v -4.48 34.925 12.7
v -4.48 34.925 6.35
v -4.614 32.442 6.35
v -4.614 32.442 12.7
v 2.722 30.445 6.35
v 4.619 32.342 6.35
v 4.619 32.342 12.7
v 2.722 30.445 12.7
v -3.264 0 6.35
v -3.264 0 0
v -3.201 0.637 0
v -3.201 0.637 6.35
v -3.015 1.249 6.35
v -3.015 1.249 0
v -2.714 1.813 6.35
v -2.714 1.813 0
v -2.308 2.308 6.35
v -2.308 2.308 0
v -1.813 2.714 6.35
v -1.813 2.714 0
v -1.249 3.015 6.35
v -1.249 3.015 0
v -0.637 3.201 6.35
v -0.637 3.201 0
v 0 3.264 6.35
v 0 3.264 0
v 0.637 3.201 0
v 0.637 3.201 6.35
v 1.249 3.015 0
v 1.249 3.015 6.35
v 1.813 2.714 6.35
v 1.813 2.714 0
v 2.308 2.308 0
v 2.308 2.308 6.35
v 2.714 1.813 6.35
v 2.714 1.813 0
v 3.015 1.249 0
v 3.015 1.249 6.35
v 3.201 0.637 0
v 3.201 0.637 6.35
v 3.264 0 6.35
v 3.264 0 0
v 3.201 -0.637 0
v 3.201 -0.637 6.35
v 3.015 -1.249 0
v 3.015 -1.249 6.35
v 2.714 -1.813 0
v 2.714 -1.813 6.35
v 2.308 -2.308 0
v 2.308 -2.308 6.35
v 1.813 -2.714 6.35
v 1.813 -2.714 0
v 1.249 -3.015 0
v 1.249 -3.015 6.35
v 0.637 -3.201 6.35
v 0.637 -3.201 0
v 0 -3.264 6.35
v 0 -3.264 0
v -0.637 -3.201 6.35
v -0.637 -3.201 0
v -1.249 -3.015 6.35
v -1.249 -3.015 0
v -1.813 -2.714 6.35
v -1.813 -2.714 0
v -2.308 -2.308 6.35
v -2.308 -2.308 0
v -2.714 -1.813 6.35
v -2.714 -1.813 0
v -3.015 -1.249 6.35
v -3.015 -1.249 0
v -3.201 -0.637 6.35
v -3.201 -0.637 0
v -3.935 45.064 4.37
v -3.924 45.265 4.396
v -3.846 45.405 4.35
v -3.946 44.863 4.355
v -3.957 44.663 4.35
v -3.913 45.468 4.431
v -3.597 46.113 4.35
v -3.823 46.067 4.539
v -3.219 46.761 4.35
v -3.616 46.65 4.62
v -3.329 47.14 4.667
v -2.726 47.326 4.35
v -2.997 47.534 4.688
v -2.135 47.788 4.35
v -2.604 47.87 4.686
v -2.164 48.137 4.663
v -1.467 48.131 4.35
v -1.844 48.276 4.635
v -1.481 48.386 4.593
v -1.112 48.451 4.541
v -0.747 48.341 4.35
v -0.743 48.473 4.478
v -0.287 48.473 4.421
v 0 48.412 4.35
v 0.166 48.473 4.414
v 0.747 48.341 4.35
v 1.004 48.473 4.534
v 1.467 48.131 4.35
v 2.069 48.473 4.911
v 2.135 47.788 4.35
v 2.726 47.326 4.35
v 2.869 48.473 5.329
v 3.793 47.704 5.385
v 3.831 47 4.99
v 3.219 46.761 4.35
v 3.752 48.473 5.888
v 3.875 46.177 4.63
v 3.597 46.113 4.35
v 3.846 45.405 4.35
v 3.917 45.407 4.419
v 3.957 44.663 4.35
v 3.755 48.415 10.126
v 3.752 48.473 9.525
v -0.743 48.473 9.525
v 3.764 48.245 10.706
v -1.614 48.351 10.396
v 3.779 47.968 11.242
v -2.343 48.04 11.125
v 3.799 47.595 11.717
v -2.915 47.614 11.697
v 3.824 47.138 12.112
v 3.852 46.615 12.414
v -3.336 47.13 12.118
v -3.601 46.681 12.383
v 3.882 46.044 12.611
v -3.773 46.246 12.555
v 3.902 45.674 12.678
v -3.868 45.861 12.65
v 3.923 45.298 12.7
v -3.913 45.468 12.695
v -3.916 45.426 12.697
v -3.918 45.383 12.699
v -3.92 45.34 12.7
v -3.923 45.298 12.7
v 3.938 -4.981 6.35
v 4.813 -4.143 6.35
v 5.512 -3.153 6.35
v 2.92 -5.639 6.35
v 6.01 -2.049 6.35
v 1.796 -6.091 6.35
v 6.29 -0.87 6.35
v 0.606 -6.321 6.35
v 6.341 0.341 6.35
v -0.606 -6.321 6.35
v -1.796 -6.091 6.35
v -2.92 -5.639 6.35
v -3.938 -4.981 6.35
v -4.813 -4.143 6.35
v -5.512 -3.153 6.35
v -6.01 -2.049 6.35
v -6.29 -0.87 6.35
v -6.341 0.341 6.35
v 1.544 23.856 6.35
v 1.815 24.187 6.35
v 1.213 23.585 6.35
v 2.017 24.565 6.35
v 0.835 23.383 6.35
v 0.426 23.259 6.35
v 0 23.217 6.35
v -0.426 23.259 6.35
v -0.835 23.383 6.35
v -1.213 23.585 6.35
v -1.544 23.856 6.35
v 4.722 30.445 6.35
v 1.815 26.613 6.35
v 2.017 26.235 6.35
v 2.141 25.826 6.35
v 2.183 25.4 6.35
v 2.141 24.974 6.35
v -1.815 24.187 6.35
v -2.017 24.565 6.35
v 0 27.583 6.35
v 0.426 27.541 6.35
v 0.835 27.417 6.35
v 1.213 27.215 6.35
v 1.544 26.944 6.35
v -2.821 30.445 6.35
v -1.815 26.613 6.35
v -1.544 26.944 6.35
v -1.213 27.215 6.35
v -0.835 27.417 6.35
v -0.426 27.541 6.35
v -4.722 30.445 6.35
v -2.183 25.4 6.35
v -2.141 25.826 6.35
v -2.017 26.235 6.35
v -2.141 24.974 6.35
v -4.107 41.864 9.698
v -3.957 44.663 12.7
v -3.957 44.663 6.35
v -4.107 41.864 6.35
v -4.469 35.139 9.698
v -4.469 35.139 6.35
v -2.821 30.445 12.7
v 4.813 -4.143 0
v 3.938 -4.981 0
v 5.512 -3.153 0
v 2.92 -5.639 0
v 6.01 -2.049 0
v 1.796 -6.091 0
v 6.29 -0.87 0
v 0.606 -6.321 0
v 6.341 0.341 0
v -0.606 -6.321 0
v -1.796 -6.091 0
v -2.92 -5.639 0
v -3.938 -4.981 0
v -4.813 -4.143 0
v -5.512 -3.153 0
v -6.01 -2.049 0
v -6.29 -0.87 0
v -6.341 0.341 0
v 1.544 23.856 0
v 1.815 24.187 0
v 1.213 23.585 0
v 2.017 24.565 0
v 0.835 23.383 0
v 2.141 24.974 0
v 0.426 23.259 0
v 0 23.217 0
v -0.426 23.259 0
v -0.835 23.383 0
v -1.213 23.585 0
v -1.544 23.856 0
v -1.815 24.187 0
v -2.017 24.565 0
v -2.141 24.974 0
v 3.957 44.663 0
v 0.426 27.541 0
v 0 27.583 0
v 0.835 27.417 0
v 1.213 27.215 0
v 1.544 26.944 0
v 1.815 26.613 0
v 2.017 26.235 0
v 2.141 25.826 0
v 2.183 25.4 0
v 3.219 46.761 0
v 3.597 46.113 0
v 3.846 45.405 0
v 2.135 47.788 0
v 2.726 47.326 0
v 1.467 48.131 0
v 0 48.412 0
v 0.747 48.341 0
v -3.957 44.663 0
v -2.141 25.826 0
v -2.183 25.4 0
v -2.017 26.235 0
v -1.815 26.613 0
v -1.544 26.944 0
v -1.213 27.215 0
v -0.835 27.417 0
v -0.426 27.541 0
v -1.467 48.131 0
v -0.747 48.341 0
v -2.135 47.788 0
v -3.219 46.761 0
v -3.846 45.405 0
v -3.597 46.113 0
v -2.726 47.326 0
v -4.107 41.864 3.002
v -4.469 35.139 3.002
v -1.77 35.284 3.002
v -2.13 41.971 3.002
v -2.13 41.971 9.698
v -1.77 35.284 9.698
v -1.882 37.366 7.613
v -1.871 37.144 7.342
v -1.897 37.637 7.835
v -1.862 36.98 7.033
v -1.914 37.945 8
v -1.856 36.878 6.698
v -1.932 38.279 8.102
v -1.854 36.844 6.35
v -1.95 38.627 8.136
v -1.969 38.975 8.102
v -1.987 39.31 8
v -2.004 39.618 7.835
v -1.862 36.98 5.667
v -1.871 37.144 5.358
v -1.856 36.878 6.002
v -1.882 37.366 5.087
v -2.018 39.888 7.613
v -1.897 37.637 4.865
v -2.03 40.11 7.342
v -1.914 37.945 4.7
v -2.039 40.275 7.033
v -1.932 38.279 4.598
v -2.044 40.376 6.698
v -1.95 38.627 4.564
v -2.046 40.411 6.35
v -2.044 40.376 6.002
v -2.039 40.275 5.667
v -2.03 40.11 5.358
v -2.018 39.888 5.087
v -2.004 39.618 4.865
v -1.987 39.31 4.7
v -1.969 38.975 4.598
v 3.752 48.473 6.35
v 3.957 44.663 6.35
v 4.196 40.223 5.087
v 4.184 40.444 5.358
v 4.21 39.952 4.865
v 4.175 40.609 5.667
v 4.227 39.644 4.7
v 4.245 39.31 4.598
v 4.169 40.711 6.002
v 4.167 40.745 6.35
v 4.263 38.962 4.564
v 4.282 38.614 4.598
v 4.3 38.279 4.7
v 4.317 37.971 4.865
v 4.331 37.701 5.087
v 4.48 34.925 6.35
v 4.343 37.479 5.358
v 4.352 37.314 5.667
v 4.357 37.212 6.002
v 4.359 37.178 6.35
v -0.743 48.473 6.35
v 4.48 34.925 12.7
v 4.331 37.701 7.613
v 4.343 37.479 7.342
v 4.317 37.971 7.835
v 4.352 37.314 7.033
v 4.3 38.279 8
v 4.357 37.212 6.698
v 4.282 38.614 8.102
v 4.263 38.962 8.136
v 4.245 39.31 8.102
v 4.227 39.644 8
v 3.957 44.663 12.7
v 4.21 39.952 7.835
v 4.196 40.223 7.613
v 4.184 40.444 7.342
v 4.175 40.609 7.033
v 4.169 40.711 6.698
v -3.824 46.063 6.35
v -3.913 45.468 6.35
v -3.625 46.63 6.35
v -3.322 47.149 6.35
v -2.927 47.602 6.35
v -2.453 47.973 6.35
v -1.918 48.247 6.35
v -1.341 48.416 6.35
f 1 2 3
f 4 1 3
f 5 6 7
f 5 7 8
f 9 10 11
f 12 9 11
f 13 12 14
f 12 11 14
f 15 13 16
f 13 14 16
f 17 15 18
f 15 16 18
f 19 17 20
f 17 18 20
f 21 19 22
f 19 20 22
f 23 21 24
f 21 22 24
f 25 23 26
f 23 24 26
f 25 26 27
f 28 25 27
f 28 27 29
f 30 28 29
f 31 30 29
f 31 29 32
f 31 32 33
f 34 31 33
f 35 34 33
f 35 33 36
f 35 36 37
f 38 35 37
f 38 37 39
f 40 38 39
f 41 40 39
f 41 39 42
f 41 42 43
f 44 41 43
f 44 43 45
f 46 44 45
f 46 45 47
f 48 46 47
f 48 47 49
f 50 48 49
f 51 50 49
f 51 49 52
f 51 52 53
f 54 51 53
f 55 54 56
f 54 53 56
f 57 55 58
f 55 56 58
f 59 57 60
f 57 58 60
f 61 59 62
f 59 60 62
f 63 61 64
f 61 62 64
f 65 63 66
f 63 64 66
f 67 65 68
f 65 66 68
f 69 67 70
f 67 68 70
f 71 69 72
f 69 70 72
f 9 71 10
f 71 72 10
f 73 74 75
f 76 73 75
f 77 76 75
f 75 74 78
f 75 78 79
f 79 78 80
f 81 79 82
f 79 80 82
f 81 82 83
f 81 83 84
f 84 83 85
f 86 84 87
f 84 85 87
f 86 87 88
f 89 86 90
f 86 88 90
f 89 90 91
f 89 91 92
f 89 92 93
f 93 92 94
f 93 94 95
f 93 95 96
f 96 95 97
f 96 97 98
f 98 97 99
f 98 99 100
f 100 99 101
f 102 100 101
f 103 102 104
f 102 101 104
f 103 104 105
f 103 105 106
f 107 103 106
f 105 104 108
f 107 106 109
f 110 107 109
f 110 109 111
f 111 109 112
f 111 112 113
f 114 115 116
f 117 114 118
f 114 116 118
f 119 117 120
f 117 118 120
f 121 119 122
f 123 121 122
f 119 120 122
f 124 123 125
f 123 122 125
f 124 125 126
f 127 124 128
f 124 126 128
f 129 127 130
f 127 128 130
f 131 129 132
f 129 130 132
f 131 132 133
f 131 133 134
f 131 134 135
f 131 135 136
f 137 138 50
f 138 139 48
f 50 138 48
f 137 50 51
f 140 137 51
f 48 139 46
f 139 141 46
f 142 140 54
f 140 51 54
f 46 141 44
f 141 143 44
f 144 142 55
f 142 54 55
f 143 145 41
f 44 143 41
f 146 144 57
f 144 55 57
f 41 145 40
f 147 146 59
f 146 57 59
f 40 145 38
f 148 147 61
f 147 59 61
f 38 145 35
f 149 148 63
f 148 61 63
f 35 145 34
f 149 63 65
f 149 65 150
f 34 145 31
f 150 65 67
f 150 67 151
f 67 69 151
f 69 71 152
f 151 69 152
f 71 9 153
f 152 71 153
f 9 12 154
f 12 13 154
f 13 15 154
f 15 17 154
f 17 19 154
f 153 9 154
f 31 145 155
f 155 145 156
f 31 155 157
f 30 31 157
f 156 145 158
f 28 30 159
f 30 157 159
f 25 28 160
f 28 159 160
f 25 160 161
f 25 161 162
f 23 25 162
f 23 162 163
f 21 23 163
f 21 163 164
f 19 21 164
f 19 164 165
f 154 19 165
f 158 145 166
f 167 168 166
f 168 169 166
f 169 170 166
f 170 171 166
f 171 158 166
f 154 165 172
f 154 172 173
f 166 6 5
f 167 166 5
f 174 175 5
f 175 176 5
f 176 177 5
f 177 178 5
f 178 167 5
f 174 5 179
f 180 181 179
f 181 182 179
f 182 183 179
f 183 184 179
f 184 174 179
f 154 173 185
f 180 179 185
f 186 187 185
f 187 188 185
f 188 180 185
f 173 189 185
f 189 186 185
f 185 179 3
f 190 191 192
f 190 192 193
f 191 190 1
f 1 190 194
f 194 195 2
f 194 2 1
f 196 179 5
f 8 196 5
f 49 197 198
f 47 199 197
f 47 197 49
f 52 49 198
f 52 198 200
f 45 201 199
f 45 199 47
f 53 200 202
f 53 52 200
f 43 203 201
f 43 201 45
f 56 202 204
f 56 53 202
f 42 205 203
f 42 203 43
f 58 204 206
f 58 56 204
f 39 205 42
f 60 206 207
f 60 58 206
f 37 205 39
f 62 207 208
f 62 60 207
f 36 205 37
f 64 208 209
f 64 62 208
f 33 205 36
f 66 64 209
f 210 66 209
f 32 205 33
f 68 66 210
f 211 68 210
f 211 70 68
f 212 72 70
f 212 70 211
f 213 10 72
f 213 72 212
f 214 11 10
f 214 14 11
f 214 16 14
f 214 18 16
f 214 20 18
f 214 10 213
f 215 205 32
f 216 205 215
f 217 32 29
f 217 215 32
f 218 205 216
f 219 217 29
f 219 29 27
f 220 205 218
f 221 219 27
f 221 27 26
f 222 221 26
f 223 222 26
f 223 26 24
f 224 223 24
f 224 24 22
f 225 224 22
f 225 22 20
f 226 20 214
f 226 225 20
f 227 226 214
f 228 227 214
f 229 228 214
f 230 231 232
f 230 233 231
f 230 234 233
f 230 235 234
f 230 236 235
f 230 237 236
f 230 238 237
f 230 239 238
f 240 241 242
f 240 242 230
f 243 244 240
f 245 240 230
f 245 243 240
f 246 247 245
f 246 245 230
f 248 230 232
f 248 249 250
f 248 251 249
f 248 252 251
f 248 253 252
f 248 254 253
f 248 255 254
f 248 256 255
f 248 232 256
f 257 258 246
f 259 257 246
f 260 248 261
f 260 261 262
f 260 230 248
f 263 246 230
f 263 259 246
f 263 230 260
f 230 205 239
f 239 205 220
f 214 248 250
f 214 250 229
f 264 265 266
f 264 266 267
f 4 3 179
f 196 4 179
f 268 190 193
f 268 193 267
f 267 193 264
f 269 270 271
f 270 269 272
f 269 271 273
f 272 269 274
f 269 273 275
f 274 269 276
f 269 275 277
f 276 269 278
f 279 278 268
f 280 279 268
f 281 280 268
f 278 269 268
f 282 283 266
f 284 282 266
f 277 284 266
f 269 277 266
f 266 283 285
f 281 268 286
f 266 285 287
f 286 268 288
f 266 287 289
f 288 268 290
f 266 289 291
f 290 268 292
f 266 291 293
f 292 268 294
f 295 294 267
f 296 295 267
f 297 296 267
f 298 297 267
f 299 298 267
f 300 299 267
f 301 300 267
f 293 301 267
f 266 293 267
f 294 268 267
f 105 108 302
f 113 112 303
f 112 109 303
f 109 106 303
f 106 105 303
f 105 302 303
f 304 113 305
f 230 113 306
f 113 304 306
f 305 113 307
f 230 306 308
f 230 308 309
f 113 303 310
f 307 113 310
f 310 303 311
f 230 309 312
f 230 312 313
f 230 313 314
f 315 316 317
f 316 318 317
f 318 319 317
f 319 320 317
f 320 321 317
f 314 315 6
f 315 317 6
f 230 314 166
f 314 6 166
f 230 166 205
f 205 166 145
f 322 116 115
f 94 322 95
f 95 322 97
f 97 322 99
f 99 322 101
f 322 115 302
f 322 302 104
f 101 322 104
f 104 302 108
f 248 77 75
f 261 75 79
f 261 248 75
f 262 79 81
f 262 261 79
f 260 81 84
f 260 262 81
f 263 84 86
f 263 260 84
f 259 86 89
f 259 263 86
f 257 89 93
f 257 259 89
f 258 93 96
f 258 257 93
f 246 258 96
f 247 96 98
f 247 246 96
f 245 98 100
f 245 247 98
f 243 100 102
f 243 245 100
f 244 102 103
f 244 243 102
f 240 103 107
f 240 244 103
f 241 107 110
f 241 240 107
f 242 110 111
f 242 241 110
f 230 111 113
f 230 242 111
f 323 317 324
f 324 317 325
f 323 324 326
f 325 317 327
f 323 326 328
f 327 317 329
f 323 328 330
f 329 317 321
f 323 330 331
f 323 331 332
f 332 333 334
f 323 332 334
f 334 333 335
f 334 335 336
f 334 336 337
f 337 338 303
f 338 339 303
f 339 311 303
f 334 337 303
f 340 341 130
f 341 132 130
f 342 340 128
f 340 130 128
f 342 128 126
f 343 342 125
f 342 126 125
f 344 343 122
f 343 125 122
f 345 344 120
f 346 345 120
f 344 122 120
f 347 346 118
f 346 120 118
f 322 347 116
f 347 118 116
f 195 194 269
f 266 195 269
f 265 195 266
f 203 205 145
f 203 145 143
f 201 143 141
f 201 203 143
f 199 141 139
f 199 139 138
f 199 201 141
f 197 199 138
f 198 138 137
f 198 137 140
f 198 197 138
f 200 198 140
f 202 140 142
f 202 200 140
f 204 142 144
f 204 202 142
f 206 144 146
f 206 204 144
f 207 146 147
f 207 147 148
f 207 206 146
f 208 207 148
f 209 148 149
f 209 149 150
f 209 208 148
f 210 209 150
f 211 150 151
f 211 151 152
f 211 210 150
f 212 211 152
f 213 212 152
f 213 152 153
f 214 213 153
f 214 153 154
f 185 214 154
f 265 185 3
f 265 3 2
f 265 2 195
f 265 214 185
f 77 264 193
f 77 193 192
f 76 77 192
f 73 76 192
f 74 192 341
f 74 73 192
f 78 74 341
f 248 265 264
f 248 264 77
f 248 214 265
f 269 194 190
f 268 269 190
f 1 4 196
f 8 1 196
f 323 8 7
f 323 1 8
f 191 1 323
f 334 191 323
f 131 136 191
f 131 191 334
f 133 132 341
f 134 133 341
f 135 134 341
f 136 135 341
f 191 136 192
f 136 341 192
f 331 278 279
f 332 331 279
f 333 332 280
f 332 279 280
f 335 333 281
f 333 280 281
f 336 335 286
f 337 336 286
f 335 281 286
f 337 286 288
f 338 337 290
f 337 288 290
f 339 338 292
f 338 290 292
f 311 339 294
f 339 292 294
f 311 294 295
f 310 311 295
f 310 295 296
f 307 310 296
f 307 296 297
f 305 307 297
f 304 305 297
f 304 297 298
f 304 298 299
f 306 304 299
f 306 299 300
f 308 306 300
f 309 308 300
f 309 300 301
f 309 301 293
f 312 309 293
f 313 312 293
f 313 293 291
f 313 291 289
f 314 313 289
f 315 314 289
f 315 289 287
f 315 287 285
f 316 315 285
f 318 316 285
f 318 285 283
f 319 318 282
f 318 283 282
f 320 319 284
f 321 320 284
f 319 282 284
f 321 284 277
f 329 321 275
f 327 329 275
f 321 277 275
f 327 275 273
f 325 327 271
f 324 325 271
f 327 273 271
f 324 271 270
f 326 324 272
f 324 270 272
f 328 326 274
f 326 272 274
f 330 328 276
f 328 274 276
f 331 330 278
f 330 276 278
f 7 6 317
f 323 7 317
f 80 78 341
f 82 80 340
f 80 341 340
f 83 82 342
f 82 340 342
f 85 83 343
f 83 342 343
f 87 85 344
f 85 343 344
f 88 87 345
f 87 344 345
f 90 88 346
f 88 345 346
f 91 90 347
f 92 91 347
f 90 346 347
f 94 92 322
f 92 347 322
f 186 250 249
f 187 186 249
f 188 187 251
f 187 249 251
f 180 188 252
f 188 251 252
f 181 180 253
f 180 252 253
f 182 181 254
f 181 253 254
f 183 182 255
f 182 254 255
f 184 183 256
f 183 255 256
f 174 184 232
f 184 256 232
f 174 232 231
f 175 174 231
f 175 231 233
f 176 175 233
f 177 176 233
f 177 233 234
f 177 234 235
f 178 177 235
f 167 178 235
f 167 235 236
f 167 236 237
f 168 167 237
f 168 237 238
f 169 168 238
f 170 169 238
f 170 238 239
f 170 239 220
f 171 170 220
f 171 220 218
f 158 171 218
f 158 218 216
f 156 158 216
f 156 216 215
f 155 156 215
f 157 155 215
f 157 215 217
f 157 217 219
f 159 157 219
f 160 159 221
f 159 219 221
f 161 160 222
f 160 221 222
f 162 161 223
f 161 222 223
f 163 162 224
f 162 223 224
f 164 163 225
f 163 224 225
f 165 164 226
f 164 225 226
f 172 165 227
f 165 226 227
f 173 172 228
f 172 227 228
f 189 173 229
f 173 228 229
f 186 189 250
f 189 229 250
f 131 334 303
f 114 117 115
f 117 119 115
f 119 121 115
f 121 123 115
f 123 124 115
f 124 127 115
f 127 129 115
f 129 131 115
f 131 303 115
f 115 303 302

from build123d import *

# Parameters (mm, degrees)
BOSS_EXTRUDE1_DEPTH              = 6.35
F_0_257_DIAMETER_HOLE1_D         = 6.5278
F_11_64_0_17188_DIAMETER_HOLE2_D = 4.365752
BOSS_EXTRUDE2_DEPTH              = 6.35
CHAMFER1_SIZE                    = 2
CHAMFER1_SIZE_2                  = 1.900651734
F_9_64_0_14063_DIAMETER_HOLE3_D  = 3.572002
CUT_EXTRUDE6_DEPTH               = 1.27
CUT_EXTRUDE6_DEPTH_BACK          = 3.175
SKETCH37_W                       = 6.696
SKETCH37_H                       = 6.696
FILLET2_R                        = 3.175


with BuildPart() as part:
    # Sketch1 → Boss-Extrude1 (new body)
    with BuildSketch(Plane.XY):
        with BuildLine():
            Line((3.956679664, 44.662837486), (6.340832795, 0.341085714))
            ThreePointArc((6.340832795, 0.341085714), (0, -6.35), (-6.340832795, 0.341085714))
            Line((-6.340832795, 0.341085714), (-3.956679664, 44.662837486))
            ThreePointArc((-3.956679664, 44.662837486), (0, 48.4124), (3.956679664, 44.662837486))
        make_face()
    extrude(amount=BOSS_EXTRUDE1_DEPTH)

    # F (0.257) Diameter Hole1 (through all)
    with Locations(Plane.XY.offset(6.35)):
        with Locations((0, 0)):
            Hole(F_0_257_DIAMETER_HOLE1_D / 2)

    # 11/64 (0.17188) Diameter Hole2 (through all)
    with Locations(Plane.XY.offset(6.35)):
        with Locations((0, 25.4)):
            Hole(F_11_64_0_17188_DIAMETER_HOLE2_D / 2)

    # Sketch8 → Boss-Extrude2 (add)
    with BuildSketch(Plane.XY.offset(6.35)):
        Polygon((4.48049686, 34.925), (3.956679664, 44.662837486), (3.751732363, 48.472837486), (-3.751732363, 48.472837486), (-3.956679664, 44.662837486), (-4.48049686, 34.925), (-4.72151149, 30.44450314), (0, 30.44450314), (4.72151149, 30.44450314), align=None)
    extrude(amount=BOSS_EXTRUDE2_DEPTH)

    # Chamfer1
    # the kernel refuses this chamfer: 2, 1.900651734 mm, written as the material it adds along each edge
    with BuildSketch(Plane(origin=(0, 44.45, 6.35), x_dir=(-0.31887891485273423, -0.9477954619338197, 0), z_dir=(0.9477954619338197, -0.31887891485273423, 0))) as chamfer1_piece_1_section:
        Polygon((3.9624, CHAMFER1_SIZE), (3.9624 + CHAMFER1_SIZE, 0), (3.9624, 0), align=None)
    chamfer1_piece_1 = revolve(axis=Axis((0, 44.45, 6.35), (0, 0, -1)), revolution_arc=322.809720089, mode=Mode.PRIVATE)
    chamfer1_piece_1 = split(chamfer1_piece_1, bisect_by=Plane(origin=(-3.847302471, 46.696175344, 4.621548789), z_dir=(0.9985563456862132, -0.05371428571428559, 0)), keep=Keep.TOP, mode=Mode.PRIVATE)
    chamfer1_piece_1 = split(chamfer1_piece_1, bisect_by=Plane(origin=(3.826743256, 47.078374128, 4.621548789), z_dir=(-0.9985563456862132, -0.05371428571428527, 0)), keep=Keep.TOP, mode=Mode.PRIVATE)
    chamfer1_piece_1 = split(chamfer1_piece_1, bisect_by=Plane(origin=(-3.562844962, 48.472837486, 4.621548789), z_dir=(0, -1, 0)), keep=Keep.TOP, mode=Mode.PRIVATE)
    add(chamfer1_piece_1)
    # the kernel refuses this chamfer: 2, 1.900651734 mm, written as the material it takes off along each edge
    with BuildSketch(Plane(origin=(-4.72151149, 30.44450314, 6.35), x_dir=(0.026237795181529237, 0.9996557297910176, 0), z_dir=(0, 0, 1))) as chamfer1_2_piece_1:
        Polygon((CHAMFER1_SIZE * 0.999621916911, -CHAMFER1_SIZE * 0.0274958766106), (CHAMFER1_SIZE_2 * 0.0262377951788, -CHAMFER1_SIZE_2 * 0.999655729687), (0, 0), align=None)
    extrude(amount=11.493365976, mode=Mode.SUBTRACT)
    with BuildSketch(Plane(origin=(4.72151149, 30.44450314, 6.35), x_dir=(-0.023285655605869076, 0.9997288523609813, 0), z_dir=(0, 0, 1))) as chamfer1_2_piece_2:
        Polygon((CHAMFER1_SIZE_2 * 0.999536361745, CHAMFER1_SIZE_2 * 0.0304476820407), (CHAMFER1_SIZE * 0.0232856556059, CHAMFER1_SIZE * 0.999728852361), (0, 0), align=None)
    extrude(amount=11.493365976, mode=Mode.SUBTRACT)

    # 9/64 (0.14063) Diameter Hole3 (through all)
    with Locations(Plane(origin=(6.340832795, 0.341085714, 0), x_dir=(0, 0, -1), z_dir=(0.9985563456862132, 0.05371428571428528, 0))):
        with Locations((-6.35, 38.676337841)):
            Hole(F_9_64_0_14063_DIAMETER_HOLE3_D / 2)

    # Sketch37 → Cut-Extrude6 (cut, two sides: drawn at the far end of the back side and taken through both)
    with BuildSketch(Plane(origin=(-1.14098275, -0.061375679, 0), x_dir=(0, 0, -1), z_dir=(0.9985563456862132, 0.05371428571428528, 0)).offset(-CUT_EXTRUDE6_DEPTH_BACK)):
        with Locations((-6.35, 38.676337841)):
            Rectangle(SKETCH37_W, SKETCH37_H)
    extrude(amount=CUT_EXTRUDE6_DEPTH + CUT_EXTRUDE6_DEPTH_BACK, mode=Mode.SUBTRACT)

    # Fillet2
    fillet2_edges = [part.edges().sort_by_distance(p)[0] for p in [
        (-3.751732363, 48.472837486, 9.294196206),
        (0, 48.472837486, 12.7),
    ]]
    fillet(fillet2_edges, radius=FILLET2_R)


solid = part.part
